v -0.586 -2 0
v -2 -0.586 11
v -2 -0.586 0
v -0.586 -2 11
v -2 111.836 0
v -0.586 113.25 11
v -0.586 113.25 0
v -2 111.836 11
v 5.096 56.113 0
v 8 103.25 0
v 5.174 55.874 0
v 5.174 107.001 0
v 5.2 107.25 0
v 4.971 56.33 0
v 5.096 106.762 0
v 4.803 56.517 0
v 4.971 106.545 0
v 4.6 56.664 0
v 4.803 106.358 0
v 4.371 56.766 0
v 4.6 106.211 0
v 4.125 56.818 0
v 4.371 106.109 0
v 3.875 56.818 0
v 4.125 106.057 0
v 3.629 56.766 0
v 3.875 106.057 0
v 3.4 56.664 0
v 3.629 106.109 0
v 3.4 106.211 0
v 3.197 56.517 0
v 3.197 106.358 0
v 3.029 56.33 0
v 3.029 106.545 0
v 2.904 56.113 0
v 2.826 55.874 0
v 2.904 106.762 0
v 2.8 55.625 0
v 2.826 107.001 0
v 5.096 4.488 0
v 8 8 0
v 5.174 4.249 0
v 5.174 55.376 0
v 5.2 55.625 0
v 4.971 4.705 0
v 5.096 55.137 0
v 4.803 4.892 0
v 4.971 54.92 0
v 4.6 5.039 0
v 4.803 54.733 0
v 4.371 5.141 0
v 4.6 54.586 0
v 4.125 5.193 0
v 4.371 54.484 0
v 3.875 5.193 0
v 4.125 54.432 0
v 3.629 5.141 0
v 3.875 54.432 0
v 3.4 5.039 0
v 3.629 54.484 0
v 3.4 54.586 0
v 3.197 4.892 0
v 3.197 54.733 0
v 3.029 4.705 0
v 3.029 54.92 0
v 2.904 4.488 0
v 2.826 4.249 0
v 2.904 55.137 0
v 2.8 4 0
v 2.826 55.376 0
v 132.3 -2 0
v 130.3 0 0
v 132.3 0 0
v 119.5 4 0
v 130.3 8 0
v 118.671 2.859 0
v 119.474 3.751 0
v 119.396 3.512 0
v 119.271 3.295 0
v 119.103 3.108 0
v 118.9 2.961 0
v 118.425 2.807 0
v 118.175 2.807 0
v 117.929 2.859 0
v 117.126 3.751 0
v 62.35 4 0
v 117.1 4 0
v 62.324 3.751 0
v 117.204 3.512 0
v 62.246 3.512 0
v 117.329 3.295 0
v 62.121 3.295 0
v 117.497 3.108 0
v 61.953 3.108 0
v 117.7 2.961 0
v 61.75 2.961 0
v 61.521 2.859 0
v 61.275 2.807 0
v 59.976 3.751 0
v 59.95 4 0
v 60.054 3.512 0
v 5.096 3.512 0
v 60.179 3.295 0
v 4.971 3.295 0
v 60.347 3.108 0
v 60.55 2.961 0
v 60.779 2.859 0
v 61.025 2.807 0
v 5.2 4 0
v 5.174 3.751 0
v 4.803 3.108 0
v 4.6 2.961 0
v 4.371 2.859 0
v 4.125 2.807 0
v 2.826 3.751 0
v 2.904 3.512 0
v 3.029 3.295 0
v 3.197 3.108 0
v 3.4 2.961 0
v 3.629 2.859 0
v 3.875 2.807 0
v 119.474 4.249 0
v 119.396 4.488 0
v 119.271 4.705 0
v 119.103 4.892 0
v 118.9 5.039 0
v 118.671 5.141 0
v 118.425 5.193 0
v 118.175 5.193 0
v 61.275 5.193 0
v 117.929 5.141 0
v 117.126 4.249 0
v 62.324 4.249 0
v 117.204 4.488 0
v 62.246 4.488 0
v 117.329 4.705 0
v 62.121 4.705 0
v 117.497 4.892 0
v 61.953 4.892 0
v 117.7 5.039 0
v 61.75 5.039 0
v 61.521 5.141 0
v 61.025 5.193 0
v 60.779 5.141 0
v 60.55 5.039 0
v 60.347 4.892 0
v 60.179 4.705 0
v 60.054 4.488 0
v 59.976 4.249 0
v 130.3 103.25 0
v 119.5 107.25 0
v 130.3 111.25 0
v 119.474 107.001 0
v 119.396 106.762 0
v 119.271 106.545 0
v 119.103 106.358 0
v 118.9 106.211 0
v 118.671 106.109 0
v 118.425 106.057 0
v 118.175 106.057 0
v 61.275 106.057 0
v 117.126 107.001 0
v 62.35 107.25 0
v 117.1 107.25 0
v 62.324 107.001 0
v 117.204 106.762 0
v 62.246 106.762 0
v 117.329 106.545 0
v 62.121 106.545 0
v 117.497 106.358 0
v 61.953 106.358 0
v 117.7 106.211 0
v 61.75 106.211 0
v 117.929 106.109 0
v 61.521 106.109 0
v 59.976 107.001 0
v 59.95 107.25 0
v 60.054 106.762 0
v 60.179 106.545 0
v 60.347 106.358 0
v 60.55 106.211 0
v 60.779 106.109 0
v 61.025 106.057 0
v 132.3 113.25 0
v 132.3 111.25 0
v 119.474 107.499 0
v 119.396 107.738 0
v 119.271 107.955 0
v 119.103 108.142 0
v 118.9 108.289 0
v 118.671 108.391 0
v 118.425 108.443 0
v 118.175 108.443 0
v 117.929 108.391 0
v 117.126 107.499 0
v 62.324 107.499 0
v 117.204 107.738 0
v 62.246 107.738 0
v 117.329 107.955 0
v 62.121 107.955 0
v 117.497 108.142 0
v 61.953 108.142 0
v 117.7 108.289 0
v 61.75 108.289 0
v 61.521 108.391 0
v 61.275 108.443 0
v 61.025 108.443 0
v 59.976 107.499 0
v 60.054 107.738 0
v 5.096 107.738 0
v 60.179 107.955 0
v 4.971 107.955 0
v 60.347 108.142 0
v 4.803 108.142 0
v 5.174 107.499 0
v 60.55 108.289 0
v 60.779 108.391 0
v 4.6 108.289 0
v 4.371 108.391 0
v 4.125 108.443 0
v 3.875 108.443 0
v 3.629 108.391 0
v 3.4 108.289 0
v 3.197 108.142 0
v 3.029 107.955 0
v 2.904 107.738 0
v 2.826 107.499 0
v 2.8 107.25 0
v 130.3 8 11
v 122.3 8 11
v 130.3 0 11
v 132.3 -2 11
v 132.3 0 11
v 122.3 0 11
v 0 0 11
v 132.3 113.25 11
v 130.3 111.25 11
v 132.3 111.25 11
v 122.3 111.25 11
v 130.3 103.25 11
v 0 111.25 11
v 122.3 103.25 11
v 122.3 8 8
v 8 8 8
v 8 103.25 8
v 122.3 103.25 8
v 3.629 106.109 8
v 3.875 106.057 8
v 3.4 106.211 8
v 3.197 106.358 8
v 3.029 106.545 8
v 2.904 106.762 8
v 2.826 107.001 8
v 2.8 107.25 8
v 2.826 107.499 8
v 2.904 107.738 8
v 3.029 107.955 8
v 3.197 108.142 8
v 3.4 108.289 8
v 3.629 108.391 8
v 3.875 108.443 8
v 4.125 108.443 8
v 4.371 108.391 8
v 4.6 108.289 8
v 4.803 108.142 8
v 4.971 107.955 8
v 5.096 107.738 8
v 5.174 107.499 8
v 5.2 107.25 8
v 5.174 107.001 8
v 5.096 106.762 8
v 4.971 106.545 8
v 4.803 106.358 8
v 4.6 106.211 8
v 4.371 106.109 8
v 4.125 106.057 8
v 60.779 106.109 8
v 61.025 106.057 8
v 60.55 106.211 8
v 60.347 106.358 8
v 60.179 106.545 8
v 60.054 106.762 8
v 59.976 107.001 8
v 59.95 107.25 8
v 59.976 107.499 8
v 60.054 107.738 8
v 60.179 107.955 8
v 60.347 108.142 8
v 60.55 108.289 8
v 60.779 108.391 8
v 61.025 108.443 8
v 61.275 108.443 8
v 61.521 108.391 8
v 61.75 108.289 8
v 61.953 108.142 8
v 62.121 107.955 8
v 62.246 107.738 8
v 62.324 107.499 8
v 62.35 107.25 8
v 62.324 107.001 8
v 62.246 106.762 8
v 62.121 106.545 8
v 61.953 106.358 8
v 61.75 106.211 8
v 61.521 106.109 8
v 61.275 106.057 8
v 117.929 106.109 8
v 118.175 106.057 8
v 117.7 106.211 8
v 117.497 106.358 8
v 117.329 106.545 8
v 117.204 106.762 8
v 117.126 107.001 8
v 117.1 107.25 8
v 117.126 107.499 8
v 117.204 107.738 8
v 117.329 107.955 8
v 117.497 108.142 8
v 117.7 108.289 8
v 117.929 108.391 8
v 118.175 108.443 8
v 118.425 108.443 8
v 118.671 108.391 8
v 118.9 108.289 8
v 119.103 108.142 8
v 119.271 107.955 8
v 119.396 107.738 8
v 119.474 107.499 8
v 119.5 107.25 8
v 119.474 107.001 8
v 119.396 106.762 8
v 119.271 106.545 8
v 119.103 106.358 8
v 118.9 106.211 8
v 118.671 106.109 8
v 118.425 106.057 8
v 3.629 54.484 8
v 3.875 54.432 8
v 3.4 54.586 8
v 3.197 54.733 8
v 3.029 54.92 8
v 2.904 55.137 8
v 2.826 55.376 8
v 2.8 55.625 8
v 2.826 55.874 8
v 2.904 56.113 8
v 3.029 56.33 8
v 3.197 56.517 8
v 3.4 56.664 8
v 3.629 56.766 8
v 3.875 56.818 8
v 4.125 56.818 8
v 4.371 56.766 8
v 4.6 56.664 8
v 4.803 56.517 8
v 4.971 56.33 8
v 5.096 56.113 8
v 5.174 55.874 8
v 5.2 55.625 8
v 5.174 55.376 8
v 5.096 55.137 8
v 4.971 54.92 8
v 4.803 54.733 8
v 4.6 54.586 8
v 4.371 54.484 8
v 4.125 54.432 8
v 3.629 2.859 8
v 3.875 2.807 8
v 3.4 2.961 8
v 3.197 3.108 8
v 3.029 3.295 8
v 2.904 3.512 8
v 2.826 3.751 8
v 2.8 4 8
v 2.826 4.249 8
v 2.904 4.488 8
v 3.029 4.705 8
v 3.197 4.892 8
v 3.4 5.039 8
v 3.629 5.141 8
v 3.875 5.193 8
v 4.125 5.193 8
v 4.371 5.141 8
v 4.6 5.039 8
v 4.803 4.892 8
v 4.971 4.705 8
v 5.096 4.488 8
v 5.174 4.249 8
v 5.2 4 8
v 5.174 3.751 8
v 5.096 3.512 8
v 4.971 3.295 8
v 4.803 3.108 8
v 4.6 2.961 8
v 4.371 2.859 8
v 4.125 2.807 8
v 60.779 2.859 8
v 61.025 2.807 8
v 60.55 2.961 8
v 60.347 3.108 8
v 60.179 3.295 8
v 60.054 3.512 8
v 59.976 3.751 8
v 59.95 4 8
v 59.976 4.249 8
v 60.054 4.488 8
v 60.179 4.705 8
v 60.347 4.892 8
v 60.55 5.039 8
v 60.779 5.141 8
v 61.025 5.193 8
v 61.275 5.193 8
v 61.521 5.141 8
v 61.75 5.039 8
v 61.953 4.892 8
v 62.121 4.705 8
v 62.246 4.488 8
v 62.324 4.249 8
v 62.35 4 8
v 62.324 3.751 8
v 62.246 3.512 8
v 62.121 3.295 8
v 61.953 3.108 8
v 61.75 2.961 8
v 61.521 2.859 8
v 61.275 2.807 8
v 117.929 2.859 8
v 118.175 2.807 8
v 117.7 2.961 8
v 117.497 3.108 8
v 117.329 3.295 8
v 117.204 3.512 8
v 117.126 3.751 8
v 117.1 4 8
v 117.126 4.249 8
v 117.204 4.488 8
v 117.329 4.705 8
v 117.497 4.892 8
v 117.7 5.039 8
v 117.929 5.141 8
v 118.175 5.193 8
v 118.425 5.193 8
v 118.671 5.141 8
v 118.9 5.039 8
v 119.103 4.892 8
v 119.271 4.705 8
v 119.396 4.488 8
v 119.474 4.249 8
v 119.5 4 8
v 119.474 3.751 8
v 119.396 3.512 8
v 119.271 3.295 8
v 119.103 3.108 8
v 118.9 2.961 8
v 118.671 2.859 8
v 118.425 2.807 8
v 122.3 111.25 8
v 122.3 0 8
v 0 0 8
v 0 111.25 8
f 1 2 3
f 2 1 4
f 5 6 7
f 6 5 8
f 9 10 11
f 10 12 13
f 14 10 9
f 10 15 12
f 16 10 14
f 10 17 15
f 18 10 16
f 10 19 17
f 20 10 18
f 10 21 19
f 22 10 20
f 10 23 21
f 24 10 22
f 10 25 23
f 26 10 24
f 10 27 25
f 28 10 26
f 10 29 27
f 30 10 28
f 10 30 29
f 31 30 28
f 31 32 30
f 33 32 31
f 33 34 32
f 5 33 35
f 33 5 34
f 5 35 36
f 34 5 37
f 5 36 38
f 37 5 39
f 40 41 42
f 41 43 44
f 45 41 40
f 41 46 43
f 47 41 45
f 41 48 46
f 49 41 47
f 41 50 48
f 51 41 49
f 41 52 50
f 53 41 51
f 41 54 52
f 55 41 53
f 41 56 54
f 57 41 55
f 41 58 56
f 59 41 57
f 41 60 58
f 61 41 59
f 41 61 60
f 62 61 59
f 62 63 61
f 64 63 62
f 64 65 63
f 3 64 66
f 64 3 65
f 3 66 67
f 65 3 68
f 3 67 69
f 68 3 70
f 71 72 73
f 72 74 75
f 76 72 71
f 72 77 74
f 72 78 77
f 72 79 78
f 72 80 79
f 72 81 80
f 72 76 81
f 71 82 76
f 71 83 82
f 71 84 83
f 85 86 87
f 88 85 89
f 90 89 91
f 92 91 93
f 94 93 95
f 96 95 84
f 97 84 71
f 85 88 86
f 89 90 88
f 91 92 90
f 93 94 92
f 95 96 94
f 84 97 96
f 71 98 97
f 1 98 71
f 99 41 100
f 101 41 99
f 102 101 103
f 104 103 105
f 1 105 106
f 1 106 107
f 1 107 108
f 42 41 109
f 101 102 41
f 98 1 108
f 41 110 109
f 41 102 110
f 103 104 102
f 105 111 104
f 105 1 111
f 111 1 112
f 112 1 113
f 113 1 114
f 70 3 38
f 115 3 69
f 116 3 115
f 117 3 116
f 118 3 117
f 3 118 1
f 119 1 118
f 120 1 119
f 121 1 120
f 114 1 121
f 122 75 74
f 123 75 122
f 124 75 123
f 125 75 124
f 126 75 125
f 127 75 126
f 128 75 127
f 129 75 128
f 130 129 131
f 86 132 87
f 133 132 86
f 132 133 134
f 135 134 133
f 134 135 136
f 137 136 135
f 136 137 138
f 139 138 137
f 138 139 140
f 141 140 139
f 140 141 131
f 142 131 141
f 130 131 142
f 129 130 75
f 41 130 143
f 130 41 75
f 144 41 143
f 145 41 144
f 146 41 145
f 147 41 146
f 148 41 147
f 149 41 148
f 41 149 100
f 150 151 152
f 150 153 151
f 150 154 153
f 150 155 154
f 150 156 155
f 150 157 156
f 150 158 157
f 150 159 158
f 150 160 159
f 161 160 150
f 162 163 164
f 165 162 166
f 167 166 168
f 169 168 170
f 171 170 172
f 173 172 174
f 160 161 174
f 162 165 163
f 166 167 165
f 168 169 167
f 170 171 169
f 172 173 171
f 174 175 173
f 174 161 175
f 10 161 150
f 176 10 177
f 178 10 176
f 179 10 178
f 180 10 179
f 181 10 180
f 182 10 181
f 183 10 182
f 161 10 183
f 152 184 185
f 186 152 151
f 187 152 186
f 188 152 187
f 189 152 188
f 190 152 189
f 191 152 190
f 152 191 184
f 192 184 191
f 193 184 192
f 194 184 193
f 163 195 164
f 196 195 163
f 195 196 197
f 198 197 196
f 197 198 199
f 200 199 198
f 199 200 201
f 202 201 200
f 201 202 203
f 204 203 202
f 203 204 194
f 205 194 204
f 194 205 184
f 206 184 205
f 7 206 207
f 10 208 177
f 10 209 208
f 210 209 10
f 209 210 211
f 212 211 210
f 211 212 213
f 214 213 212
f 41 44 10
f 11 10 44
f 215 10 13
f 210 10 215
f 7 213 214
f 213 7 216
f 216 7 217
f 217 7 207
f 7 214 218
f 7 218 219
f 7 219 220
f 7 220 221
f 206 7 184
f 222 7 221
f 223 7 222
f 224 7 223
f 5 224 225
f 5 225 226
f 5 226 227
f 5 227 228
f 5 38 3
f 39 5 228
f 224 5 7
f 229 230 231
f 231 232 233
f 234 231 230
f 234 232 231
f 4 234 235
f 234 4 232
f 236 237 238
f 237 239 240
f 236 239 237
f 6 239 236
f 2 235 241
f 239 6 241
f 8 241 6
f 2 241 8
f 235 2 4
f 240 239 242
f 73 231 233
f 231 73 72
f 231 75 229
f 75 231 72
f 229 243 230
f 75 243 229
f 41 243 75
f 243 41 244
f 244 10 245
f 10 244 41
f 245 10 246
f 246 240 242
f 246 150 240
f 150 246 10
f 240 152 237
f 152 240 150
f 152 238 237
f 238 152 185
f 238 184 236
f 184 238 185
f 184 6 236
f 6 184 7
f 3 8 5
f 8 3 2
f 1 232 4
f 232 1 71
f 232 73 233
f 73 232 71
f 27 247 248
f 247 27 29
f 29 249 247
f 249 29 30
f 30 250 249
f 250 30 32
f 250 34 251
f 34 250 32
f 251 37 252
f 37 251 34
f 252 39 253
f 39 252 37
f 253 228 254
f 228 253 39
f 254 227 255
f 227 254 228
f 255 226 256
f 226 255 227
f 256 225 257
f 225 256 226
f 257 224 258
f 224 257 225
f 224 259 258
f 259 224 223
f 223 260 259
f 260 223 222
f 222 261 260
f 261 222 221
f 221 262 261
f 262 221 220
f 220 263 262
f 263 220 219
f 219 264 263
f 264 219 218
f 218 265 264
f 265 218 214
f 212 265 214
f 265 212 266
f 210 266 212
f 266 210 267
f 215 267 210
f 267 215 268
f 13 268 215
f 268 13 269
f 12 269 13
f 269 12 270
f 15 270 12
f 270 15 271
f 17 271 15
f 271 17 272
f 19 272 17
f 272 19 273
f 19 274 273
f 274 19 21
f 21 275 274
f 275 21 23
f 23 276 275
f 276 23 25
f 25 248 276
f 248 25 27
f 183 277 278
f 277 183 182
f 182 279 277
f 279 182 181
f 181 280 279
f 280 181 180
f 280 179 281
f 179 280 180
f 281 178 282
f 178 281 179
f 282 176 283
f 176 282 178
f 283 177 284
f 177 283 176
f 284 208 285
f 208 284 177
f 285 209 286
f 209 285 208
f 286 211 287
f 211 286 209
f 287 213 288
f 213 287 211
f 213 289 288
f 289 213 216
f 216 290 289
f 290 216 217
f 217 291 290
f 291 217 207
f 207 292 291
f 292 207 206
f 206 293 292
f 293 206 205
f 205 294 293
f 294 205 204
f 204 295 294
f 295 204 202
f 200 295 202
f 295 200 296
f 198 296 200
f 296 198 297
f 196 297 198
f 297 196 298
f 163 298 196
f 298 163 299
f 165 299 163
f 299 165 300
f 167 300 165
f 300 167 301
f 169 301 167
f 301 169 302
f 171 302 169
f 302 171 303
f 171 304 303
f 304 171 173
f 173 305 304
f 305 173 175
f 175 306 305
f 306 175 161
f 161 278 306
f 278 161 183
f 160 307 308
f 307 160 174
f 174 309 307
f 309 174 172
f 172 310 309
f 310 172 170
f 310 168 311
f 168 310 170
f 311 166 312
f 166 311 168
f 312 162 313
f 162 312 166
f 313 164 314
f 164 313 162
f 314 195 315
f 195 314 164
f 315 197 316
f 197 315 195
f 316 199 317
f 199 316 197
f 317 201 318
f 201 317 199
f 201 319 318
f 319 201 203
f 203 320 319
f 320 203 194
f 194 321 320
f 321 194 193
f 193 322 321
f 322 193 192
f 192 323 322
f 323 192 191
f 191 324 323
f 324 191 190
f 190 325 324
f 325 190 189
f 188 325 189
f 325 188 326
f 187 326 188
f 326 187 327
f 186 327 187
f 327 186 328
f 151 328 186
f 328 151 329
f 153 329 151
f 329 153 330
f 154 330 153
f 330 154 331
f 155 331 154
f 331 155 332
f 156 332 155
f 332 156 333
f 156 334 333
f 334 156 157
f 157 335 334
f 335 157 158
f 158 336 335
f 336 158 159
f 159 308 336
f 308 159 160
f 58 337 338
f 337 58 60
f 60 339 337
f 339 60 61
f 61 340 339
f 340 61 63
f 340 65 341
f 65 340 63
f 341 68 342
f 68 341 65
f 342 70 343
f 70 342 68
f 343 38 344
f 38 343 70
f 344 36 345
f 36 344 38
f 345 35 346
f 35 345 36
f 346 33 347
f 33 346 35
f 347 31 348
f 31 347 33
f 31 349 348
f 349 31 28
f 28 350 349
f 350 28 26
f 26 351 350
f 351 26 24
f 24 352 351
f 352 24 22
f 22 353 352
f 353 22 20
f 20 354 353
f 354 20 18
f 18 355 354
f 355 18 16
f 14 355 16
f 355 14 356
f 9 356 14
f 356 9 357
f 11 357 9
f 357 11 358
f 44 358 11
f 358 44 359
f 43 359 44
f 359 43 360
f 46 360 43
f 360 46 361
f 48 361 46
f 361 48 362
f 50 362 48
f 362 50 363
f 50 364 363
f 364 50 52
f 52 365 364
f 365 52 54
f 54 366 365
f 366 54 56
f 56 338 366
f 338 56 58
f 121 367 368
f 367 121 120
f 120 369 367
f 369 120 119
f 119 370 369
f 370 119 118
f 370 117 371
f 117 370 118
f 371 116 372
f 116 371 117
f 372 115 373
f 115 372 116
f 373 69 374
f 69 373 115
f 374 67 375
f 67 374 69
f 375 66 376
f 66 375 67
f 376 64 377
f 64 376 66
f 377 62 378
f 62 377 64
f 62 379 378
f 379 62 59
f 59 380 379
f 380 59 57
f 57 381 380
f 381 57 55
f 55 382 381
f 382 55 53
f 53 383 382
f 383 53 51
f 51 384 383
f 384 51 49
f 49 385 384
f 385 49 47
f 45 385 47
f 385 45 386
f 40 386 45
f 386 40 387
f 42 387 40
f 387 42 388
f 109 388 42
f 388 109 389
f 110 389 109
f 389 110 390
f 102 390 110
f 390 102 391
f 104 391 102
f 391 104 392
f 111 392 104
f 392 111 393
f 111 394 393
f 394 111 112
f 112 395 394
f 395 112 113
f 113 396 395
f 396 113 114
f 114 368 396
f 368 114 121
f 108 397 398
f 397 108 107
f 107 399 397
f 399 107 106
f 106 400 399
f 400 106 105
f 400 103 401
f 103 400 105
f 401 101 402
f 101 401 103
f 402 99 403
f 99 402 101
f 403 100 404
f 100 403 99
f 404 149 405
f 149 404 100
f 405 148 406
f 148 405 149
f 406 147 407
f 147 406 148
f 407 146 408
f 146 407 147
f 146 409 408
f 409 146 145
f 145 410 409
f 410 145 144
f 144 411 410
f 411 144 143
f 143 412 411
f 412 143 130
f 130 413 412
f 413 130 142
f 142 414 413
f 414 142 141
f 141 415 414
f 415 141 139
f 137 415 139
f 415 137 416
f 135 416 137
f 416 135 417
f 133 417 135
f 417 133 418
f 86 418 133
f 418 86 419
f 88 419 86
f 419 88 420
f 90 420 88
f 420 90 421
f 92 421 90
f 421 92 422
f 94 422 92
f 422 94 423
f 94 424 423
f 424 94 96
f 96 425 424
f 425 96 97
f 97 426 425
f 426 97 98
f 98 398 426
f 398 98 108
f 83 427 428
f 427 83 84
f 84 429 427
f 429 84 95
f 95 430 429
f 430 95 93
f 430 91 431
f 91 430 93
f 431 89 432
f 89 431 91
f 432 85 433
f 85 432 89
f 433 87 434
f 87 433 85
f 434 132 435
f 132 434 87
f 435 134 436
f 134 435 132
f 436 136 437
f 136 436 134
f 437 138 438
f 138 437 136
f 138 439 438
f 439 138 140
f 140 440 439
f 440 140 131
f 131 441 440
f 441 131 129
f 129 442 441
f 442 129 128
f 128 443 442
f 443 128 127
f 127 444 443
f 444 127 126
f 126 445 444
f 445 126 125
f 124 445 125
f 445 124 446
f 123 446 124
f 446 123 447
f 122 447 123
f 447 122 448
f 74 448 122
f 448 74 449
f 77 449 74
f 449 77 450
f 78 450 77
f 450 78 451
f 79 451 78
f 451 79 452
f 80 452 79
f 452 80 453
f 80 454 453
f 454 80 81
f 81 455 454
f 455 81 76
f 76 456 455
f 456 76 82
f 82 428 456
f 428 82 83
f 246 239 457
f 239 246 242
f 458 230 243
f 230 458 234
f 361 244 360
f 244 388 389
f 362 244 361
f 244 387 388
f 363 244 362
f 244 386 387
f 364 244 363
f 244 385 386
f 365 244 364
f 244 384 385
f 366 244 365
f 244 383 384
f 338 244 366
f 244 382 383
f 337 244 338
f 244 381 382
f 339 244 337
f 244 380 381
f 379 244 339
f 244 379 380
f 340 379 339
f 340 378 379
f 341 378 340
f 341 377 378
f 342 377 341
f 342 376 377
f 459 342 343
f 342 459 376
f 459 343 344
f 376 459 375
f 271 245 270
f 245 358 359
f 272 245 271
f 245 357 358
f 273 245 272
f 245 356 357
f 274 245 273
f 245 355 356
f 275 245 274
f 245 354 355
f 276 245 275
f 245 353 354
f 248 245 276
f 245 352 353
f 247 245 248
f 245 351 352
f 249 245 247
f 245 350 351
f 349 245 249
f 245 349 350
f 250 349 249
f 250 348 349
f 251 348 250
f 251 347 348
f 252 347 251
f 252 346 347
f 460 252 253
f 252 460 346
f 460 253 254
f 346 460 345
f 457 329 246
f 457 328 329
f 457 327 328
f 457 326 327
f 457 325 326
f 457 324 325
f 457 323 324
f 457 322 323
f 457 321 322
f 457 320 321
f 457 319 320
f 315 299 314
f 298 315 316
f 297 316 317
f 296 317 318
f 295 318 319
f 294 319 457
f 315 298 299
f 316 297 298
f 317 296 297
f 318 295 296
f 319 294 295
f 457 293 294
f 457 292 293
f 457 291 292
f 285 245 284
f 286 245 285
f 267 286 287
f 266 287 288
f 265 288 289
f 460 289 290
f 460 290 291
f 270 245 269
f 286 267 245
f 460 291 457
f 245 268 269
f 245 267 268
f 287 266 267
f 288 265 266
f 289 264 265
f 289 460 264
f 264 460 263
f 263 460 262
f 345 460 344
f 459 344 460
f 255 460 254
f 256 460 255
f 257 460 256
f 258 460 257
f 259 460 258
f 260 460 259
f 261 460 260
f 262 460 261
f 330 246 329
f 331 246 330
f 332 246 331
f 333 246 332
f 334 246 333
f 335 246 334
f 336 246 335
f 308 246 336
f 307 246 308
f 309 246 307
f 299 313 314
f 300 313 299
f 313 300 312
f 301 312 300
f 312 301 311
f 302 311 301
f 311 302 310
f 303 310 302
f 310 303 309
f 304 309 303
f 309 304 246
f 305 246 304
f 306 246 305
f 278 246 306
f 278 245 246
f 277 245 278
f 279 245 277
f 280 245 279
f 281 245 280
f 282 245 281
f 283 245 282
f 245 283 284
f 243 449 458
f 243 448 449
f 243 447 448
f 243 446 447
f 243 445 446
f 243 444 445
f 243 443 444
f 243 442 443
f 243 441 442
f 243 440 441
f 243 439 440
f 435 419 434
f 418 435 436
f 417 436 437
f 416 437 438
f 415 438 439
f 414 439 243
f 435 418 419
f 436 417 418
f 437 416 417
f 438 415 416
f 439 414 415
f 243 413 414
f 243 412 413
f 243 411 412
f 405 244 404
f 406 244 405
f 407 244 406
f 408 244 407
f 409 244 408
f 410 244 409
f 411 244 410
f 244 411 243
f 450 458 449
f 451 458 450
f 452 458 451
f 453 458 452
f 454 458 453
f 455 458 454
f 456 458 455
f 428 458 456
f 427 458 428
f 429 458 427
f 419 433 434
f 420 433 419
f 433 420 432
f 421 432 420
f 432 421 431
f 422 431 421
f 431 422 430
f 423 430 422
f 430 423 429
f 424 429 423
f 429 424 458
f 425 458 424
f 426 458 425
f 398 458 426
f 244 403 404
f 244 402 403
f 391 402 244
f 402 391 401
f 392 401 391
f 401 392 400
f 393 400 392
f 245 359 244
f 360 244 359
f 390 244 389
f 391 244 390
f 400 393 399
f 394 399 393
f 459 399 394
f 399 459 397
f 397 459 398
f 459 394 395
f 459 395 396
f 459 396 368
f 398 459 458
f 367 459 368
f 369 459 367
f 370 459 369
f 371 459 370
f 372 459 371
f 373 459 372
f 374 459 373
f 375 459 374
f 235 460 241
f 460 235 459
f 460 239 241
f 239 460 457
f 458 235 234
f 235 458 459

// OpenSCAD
// file: mounting.scad
include <vars.scad>

module m2(position)
{
    translate(position) circle(d = 2.2 * mm);
}

module m2_insert(position)
{
    translate(position) circle(d = 3 * mm);
}

module m2_3dp(position)
{
    // Additional tolerance over typical M2 holes
    translate(position) circle(d = 2.4 * mm);
}

module m2_head(position)
{
    translate(position) circle(d = 4.2 * mm);
}

module m2_spacer(position)
{
    translate(position) circle(d = 3.6 * mm);
}

module mx_1u()
{
    square(14 * mm, center = true);
}

module skuf_slot()
{
    hull()
    {
        for (i = [ -0.5, 0.5 ])
        {
            translate([ i * (skuf_width - skuf_height), 0 ]) circle(d = skuf_height);
        }
    }
}

module dovetail(width, height, skew)
{
    polygon([
        [ -0.5 * width, -0.5 * (height + skew) ],
        [ 0.5 * width, -0.5 * (height - skew) ],
        [ 0.5 * width, 0.5 * (height - skew) ],
        [ -0.5 * width, 0.5 * (height + skew) ],
    ]);
}
// file: rounded_square.scad
module rounded_square(size,radius) {
    hull() {
        translate([radius, radius])
            circle(radius);
        translate([size.x - radius, radius])
            circle(radius);
        translate([radius, size.y - radius])
            circle(radius);
        translate([size.x - radius, size.y - radius])
            circle(radius);
    }
}
// file: vars.scad
$fs = 0.1;

mm = 1.0;
inch = 25.4;

rows = 5;
board_cols = 15;
hand_cols = 6;
center_cols = board_cols - 2 * hand_cols;

key_width = 0.75 * inch;
key_height = 0.75 * inch;

keyway_height = key_height * rows;
board_keyway_width = key_width * board_cols;
hand_keyway_width = key_width * hand_cols;
center_cover_width = key_width * center_cols;

plate_margin = 8 * mm;

plate_height = keyway_height + 2 * plate_margin;
board_plate_width = board_keyway_width + 2 * plate_margin;
hand_plate_width = hand_keyway_width + plate_margin; // margin only on outer edge

plate_corner_radius = 2 * mm;

mount_bottom = 0.5 * plate_margin;
mount_vcenter = 0.5 * plate_height;
mount_top = plate_height - 0.5 * plate_margin;

mount_left = 0.5 * plate_margin;
mount_hand_hcenter = 0.5 * hand_plate_width;
mount_hand_right = hand_plate_width - 0.5 * plate_margin;
mount_board_hcenter = 0.5 * board_plate_width;
mount_board_right = board_plate_width - 0.5 * plate_margin;

plate_thickness = 3 * mm;
case_depth = 10 * mm;

plate_color = [ 0, 0, 0, 0.2 ]; // rgba

center_cover_mounting_inset = 0.15 * inch;

case_overhang = 2 * mm;
hand_case_width = hand_plate_width + case_overhang + plate_margin;
middle_shell_bridge_height = 6 * mm;
case_height = plate_height + 2 * case_overhang;
top_shell_height = 8 * mm;
thread_depth = 6 * mm;
shell_chamfer = 2 * mm;
middle_shell_standoff_height = 8 * mm;
middle_shell_total_height = middle_shell_standoff_height + plate_thickness;
shell_center_lip = 2 * mm;
bottom_shell_thickness = 3 * mm;
bottom_shell_screw_recess = 2 * mm;
bottom_shell_skuf_inset = 8 * mm;
bottom_shell_joint_width = 2 * mm;
bottom_shell_joint_skew = 1 * mm;
bottom_shell_width = hand_plate_width + case_overhang + 0.5 * center_cover_width + 0.5 * bottom_shell_joint_width;

front_cover_width = center_cover_width - 2 * plate_margin;
front_cover_height = middle_shell_total_height + top_shell_height - plate_thickness;
front_cover_depth = plate_margin;

rear_cover_thickness = 1 * mm;

skuf_width = 42.0 * mm;
skuf_height = 6.0 * mm;
skuf_depth = 0.5 * mm;
// main file
include <vars.scad>

use <rounded_square.scad>
use <mounting.scad>

module middle_shell()
{
	difference()
	{
		// Base shape
		linear_extrude(middle_shell_total_height) difference()
		{
			translate([ -case_overhang, -case_overhang ])
			square([ hand_case_width + shell_center_lip, case_height ]);

			translate([ plate_margin, plate_margin ])
			square([ hand_case_width, keyway_height ]);

			// translate([ hand_plate_width, 0 ])
			// square([ shell_center_lip, plate_height ]);

			// M2 screw holes to line up with switch plate
			m2_3dp([ mount_left, mount_bottom ]);
			m2_3dp([ mount_hand_hcenter, mount_bottom ]);
			m2_3dp([ mount_hand_right, mount_bottom ]);
			m2_3dp([ mount_left, mount_vcenter ]);
			m2_3dp([ mount_left, mount_top ]);
			m2_3dp([ mount_hand_hcenter, mount_top ]);
			m2_3dp([ mount_hand_right, mount_top ]);

			translate([hand_case_width - case_overhang, 0])
				square([shell_center_lip + 0.01 * mm, case_height - 2 * case_overhang]);
		}

		// Plate recess
		translate([ 0, 0, middle_shell_standoff_height ])
		cube([ hand_plate_width, plate_height, plate_thickness + 0.01 * mm ]);

		// Chamfer edges
		translate([ -case_overhang, -case_overhang ])
		{
			for (i = [0:1])
			{
				translate([ 0, i * case_height, 0 ])
				rotate([ 0, 0, 45 ])
				cube([ shell_chamfer, shell_chamfer, middle_shell_total_height * 2.1 ], center = true);
			}
		}
	}
}

middle_shell();
